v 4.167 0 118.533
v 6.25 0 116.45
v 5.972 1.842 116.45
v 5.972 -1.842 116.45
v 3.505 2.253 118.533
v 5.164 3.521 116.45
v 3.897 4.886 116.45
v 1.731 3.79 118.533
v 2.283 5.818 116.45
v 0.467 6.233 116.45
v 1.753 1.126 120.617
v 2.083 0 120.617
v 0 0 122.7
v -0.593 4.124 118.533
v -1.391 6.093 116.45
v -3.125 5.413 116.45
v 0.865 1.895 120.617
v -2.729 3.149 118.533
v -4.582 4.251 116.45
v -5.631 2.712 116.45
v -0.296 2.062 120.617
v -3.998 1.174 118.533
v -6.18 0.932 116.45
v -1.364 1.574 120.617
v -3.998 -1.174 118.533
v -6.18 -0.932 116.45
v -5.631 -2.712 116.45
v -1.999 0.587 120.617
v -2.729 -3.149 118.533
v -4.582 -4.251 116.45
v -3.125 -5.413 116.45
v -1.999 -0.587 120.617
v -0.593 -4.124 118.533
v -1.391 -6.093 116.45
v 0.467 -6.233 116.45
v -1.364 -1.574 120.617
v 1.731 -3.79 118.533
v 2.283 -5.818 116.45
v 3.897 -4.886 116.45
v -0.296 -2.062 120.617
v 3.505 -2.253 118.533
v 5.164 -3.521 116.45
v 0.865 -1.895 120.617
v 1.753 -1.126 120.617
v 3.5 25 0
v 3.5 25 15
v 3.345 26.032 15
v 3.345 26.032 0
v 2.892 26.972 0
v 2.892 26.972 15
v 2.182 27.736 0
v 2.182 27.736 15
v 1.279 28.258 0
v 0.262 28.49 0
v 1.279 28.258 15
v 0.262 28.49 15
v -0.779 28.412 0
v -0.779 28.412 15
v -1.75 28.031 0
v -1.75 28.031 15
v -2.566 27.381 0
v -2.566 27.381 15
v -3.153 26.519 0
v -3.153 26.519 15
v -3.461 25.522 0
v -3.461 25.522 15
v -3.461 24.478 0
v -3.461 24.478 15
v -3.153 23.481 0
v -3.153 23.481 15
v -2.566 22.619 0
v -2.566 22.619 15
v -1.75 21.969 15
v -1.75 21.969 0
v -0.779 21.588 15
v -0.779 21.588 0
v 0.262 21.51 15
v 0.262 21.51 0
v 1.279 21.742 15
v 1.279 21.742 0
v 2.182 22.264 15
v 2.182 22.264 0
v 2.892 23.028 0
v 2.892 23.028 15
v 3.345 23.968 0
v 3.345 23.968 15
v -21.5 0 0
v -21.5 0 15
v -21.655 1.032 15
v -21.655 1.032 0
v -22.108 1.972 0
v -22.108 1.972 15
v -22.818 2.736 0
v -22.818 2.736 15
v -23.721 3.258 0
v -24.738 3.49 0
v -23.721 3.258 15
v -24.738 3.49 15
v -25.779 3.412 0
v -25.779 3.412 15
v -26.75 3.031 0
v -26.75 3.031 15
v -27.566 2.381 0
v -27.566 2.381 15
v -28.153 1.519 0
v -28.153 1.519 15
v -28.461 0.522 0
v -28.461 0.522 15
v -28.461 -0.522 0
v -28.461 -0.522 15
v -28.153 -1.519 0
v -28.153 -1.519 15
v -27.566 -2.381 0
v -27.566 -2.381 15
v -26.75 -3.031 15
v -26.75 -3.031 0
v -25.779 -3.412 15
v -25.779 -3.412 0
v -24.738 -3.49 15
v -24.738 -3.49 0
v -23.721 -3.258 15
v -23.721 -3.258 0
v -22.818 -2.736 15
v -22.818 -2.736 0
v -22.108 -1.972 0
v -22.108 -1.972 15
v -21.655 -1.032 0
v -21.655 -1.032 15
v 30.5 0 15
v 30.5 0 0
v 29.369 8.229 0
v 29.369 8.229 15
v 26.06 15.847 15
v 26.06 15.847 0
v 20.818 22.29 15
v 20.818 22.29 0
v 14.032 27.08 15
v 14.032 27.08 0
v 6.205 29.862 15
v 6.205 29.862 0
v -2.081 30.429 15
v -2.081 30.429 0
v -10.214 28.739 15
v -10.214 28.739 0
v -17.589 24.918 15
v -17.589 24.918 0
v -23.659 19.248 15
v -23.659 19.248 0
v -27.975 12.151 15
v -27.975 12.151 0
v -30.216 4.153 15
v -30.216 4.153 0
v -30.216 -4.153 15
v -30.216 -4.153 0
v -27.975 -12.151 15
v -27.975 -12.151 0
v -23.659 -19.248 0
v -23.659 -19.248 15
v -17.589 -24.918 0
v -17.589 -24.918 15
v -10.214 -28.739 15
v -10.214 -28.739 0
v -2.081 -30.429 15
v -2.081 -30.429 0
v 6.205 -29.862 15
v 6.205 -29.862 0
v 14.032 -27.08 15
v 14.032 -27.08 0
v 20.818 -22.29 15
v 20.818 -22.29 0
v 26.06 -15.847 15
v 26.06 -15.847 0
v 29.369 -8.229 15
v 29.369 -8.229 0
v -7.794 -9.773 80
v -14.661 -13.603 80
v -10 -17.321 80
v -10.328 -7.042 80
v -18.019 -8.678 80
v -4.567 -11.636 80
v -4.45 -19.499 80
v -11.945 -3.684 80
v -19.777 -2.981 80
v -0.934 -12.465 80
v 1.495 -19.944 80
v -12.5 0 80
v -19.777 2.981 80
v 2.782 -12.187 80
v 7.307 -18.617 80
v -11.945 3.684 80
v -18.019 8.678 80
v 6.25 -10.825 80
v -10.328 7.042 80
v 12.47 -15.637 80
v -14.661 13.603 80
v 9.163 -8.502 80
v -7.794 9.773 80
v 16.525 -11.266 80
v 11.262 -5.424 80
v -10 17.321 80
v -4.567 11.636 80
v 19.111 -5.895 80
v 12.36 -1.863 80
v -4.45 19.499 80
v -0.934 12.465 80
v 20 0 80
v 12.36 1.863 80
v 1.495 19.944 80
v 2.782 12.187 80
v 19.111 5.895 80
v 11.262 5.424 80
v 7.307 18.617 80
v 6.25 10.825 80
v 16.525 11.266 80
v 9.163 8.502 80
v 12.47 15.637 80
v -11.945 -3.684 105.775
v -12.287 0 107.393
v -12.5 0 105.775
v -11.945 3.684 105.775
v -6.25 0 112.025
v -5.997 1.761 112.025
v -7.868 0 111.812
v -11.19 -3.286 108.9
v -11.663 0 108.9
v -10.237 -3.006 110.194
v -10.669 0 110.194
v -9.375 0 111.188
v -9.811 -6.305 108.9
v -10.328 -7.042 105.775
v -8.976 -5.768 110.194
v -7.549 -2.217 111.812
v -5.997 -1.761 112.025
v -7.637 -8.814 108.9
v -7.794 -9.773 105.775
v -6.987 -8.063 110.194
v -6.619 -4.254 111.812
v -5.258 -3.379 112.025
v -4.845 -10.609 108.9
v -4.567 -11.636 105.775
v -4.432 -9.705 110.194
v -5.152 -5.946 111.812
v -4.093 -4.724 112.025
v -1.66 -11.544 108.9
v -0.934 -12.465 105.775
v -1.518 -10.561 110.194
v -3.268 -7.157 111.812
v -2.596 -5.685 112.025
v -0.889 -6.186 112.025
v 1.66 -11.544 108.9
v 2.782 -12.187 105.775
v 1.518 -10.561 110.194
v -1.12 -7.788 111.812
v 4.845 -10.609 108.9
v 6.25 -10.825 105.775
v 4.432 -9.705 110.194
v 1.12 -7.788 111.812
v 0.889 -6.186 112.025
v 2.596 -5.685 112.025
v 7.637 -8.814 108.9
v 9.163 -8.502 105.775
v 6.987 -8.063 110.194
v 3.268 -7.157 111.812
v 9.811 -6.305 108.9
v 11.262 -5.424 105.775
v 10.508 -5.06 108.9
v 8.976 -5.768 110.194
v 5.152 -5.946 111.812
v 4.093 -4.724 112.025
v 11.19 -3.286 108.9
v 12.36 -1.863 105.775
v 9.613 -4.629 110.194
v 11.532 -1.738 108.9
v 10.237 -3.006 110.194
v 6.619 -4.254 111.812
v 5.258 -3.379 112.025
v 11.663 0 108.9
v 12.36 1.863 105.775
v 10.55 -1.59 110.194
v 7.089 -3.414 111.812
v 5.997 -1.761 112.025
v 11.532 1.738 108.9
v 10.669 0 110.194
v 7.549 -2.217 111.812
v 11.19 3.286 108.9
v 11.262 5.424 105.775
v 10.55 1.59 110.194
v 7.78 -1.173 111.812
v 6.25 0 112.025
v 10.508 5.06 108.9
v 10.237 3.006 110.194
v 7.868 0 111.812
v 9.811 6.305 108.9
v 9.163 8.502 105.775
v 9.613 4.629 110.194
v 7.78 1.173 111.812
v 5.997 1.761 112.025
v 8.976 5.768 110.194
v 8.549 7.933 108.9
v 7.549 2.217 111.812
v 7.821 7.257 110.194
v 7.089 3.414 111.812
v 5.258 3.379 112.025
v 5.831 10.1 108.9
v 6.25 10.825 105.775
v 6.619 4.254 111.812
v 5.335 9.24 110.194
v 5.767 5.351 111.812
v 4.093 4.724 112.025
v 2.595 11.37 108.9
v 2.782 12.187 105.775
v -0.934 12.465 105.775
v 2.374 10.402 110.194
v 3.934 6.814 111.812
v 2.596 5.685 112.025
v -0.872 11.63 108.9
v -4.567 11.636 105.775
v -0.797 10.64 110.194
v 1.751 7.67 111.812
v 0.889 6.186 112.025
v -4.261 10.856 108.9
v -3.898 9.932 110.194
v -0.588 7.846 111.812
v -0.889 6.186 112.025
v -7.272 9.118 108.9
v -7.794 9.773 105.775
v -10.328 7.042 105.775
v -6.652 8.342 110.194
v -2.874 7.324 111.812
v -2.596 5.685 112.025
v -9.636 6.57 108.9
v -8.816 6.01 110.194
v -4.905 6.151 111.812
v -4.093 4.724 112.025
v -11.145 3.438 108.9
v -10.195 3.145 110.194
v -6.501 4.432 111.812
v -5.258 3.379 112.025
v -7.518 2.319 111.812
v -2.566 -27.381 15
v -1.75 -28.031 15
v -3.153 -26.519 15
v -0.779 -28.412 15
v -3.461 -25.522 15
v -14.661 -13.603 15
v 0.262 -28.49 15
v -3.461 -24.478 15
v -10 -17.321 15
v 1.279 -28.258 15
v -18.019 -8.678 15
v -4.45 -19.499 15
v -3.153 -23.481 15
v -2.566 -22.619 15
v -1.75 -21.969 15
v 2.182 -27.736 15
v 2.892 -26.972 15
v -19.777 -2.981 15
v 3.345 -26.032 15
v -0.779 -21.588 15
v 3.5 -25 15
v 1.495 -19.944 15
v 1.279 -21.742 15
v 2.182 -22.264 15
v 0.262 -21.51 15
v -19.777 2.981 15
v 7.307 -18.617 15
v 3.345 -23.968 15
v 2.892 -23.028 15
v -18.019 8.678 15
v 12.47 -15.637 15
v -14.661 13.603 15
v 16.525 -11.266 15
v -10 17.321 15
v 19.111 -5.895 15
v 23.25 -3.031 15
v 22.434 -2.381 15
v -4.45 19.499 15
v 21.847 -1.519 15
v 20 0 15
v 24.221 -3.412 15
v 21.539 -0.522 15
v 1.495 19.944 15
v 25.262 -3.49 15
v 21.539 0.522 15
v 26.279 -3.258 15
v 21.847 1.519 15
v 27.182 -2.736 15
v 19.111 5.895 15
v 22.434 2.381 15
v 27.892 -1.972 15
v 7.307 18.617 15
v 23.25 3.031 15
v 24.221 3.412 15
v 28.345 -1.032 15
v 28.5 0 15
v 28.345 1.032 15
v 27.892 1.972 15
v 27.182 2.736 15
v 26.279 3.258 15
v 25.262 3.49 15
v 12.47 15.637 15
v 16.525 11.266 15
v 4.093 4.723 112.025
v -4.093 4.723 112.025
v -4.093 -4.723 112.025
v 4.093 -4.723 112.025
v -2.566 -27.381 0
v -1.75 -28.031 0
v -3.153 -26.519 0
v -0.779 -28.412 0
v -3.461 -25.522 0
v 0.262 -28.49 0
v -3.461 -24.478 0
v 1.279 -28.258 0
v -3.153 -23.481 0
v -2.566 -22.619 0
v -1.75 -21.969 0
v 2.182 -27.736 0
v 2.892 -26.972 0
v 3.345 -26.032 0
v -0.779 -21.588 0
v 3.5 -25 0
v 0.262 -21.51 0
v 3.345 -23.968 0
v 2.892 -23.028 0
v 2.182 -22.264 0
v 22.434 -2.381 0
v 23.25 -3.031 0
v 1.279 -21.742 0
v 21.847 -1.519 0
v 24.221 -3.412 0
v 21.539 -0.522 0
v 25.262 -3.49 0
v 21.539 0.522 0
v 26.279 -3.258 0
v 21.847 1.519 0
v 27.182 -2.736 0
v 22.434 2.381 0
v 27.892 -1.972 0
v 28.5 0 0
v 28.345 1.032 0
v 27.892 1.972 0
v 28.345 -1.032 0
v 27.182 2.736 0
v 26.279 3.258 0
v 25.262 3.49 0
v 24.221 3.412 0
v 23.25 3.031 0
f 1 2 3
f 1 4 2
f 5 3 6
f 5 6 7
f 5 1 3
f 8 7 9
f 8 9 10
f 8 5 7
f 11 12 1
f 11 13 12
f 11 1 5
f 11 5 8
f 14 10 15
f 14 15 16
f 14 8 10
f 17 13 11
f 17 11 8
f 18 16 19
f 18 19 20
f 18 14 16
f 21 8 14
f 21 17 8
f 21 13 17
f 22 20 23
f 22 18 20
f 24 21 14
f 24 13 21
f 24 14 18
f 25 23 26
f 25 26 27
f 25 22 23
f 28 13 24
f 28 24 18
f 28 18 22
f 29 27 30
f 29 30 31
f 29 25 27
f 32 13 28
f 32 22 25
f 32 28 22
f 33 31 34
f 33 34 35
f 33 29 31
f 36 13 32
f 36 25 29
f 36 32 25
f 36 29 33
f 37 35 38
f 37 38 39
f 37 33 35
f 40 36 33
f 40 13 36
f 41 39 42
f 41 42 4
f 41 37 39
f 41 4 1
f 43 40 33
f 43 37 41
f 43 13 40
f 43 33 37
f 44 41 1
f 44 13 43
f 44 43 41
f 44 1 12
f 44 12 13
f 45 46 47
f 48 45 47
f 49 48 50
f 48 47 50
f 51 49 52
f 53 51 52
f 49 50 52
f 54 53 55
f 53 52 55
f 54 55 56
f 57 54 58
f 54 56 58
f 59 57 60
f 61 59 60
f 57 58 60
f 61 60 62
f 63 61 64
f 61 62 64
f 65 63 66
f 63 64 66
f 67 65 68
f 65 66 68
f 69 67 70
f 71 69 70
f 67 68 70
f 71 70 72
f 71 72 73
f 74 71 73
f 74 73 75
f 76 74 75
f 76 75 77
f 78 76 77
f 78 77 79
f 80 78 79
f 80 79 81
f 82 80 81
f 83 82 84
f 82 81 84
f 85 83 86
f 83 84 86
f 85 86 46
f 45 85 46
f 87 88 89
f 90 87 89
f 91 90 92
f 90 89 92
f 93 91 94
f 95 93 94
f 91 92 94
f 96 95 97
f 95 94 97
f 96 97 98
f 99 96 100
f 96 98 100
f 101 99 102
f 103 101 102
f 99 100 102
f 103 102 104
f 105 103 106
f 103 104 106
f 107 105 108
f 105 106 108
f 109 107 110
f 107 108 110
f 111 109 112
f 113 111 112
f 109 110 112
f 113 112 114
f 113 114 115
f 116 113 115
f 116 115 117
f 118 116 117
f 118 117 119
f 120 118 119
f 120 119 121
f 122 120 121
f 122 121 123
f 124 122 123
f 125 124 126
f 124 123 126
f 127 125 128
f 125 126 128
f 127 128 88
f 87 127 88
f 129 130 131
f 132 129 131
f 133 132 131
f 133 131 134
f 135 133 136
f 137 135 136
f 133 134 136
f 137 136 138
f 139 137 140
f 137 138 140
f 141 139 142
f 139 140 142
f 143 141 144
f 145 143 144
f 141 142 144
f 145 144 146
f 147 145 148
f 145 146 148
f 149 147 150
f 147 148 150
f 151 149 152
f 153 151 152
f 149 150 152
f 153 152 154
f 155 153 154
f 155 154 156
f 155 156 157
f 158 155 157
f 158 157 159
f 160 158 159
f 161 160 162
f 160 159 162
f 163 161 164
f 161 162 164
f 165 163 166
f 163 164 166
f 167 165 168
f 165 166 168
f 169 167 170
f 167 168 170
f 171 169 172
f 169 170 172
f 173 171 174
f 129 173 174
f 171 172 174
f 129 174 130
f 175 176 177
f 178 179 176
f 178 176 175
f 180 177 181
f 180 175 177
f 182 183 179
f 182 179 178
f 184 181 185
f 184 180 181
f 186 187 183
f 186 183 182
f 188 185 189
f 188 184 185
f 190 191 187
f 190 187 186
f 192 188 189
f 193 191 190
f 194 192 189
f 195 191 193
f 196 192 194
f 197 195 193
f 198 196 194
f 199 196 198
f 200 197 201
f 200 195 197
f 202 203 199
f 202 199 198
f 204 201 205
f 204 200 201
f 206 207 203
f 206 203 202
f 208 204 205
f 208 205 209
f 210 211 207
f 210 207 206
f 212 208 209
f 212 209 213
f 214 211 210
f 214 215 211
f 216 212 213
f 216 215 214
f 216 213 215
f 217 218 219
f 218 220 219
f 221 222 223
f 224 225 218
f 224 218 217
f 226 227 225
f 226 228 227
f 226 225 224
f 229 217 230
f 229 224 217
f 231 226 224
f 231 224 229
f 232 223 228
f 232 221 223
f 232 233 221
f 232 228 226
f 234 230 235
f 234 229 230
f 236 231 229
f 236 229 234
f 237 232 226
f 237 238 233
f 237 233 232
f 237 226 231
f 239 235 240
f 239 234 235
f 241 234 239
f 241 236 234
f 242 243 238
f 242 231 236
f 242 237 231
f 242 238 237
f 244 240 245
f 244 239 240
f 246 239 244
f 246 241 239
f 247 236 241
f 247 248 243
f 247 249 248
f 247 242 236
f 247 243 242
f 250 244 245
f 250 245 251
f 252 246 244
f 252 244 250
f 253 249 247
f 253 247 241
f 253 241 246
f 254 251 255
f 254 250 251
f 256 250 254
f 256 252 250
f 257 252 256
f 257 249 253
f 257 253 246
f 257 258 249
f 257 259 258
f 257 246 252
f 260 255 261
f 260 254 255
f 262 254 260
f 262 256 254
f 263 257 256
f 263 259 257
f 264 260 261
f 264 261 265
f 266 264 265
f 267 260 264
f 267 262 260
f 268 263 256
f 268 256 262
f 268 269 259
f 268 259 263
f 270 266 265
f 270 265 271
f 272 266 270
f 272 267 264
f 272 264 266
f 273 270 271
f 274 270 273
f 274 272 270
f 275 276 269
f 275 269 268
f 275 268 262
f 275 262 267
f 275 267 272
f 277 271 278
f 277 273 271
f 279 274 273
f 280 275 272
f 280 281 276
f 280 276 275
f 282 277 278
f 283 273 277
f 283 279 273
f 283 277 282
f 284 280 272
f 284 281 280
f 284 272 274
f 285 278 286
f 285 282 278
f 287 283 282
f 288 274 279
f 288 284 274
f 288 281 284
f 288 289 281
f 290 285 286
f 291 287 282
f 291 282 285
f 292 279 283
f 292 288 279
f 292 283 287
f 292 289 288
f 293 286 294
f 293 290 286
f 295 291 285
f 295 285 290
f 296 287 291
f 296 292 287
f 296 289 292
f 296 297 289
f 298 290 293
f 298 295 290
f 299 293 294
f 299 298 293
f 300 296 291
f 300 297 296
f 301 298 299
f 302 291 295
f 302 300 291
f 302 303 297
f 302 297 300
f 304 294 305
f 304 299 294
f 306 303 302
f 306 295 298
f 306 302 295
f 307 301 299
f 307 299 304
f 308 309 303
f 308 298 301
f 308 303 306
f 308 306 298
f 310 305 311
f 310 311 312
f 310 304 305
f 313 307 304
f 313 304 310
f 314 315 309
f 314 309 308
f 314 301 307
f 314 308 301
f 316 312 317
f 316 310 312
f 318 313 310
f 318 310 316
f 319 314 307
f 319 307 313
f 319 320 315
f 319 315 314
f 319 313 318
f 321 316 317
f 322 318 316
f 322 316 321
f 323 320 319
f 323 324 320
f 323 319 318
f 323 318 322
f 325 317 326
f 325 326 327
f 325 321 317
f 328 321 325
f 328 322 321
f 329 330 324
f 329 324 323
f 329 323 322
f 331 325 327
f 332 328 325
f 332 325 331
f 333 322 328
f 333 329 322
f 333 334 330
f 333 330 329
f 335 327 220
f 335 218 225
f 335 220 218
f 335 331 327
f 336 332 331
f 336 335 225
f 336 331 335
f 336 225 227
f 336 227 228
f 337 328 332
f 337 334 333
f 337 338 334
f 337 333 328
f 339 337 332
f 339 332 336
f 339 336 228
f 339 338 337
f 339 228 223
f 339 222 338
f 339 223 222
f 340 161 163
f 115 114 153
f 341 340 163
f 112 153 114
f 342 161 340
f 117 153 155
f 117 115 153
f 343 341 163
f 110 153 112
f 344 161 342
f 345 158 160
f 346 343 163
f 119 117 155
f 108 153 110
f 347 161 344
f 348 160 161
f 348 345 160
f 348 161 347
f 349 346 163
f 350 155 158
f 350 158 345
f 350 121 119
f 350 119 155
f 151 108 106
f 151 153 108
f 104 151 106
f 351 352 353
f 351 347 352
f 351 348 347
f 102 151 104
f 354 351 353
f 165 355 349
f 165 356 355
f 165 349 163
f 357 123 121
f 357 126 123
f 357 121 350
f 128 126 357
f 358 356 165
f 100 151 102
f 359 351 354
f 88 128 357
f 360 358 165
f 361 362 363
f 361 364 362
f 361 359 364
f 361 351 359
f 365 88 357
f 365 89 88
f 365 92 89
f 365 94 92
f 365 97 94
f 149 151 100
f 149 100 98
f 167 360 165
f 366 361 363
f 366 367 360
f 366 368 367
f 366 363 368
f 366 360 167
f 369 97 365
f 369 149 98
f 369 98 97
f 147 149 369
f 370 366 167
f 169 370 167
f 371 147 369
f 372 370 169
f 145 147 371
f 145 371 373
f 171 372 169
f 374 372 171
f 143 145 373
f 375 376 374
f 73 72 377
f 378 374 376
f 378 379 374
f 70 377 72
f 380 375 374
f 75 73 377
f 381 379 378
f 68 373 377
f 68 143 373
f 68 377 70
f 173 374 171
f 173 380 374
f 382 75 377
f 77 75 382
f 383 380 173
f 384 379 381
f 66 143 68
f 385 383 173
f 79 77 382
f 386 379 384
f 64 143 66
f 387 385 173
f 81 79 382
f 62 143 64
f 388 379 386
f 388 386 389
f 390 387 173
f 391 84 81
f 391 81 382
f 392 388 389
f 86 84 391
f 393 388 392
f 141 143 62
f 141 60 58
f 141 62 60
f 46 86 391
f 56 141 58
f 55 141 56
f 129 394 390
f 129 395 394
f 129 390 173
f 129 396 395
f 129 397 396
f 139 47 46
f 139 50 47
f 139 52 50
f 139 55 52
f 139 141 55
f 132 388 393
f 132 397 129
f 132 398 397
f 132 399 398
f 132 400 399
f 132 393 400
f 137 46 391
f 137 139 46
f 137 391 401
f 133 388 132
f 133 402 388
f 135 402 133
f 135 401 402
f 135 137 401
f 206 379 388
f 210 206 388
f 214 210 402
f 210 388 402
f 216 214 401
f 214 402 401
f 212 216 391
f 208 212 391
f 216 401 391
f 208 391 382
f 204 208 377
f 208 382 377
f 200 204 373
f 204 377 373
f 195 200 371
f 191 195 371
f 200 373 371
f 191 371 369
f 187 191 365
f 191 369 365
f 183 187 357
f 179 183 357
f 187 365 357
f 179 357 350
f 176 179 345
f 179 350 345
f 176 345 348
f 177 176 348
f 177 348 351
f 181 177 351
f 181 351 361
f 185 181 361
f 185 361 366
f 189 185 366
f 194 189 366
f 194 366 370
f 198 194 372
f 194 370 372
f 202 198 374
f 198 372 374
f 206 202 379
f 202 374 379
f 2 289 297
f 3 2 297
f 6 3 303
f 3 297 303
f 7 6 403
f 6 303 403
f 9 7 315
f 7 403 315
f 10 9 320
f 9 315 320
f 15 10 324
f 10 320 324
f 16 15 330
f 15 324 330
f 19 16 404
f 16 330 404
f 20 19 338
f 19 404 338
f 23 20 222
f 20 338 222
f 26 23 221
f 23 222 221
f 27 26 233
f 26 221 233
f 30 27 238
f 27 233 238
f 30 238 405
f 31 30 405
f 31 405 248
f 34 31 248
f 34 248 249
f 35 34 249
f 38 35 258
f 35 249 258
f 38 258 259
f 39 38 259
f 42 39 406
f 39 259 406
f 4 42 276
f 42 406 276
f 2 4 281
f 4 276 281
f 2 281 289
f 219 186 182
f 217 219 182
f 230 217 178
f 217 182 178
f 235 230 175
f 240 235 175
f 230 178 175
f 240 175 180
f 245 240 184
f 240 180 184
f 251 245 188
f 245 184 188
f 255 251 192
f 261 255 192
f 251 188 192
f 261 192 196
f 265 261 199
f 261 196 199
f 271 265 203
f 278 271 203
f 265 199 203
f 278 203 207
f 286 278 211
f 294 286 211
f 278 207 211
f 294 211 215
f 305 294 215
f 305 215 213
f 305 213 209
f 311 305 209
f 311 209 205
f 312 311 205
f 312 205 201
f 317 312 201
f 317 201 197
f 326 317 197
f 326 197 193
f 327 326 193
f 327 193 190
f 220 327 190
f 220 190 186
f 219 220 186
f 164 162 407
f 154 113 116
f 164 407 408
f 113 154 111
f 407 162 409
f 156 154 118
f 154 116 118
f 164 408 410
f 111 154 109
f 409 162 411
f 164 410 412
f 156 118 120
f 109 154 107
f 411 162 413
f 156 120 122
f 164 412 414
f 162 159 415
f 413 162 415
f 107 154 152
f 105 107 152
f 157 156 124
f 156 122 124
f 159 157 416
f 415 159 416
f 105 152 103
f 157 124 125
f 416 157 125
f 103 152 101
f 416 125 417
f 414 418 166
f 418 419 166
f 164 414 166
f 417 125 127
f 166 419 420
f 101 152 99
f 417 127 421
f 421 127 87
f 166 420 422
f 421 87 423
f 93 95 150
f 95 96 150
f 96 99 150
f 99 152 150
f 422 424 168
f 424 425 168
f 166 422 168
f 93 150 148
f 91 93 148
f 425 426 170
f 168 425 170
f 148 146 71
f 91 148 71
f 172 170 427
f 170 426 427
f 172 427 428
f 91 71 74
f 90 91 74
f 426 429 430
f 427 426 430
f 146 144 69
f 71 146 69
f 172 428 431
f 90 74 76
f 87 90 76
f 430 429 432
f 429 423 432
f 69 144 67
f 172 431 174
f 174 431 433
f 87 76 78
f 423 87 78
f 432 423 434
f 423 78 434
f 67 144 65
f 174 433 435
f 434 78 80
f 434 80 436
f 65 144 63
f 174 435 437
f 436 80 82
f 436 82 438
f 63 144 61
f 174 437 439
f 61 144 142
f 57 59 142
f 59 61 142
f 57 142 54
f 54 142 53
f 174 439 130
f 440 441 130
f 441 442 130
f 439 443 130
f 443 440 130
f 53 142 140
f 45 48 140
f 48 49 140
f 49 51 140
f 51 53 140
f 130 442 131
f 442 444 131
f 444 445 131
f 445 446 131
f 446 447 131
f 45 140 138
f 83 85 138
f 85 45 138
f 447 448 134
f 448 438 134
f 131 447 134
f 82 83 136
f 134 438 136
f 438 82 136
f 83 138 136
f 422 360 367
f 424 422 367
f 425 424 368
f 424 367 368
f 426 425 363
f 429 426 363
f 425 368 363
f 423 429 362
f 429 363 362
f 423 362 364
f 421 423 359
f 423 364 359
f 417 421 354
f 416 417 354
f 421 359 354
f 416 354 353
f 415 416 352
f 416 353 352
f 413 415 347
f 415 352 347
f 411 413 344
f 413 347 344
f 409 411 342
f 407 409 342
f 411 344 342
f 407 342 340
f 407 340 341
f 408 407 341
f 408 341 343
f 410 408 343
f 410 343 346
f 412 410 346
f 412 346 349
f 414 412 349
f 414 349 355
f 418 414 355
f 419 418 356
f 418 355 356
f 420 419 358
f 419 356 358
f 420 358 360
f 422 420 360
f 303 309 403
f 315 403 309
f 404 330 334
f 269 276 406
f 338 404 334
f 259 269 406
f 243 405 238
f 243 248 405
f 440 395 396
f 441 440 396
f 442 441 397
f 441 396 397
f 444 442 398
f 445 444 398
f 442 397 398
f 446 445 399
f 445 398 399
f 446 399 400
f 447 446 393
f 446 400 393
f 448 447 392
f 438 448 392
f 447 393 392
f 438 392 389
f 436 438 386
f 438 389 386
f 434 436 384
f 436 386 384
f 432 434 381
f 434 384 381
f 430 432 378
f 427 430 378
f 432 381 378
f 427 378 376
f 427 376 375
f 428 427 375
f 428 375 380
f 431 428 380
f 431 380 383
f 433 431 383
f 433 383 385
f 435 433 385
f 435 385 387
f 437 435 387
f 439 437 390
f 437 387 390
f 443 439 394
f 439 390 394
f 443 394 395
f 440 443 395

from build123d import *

# Parameters (mm, degrees)
SKETCH1_R           = 30.5
BOSS_EXTRUDE1_DEPTH = 15
SKETCH2_R           = 3.5
CUT_EXTRUDE1_DEPTH  = 15
SKETCH3_R           = 20
BOSS_EXTRUDE2_DEPTH = 65
SKETCH4_R           = 12.5
BOSS_EXTRUDE3_DEPTH = 42.7
CUT_EXTRUDE2_START  = -10.675
SKETCH5_R           = 12.5
SKETCH5_R_2         = 6.25
CUT_EXTRUDE2_DEPTH  = 10.675
FILLET1_R           = 6.25
CHAMFER1_SIZE       = 6.25


with BuildPart() as part:
    # Sketch1 → Boss-Extrude1 (new body)
    with BuildSketch(Plane.XY):
        Circle(SKETCH1_R)
    extrude(amount=BOSS_EXTRUDE1_DEPTH)

    # Sketch2 → Cut-Extrude1 (cut)
    with BuildSketch(Plane.XY.offset(15)):
        with Locations((0, 25)):
            Circle(SKETCH2_R)
        with Locations((25, 0)):
            Circle(SKETCH2_R)
        with Locations((0, -25)):
            Circle(SKETCH2_R)
        with Locations((-25, 0)):
            Circle(SKETCH2_R)
    extrude(amount=-CUT_EXTRUDE1_DEPTH, mode=Mode.SUBTRACT)

    # Sketch3 → Boss-Extrude2 (add)
    with BuildSketch(Plane.XY.offset(15)):
        Circle(SKETCH3_R)
    extrude(amount=BOSS_EXTRUDE2_DEPTH)

    # Sketch4 → Boss-Extrude3 (add)
    with BuildSketch(Plane.XY.offset(80)):
        with Locations(Location((0, 0, 0), (0, 0, 180))):
            Circle(SKETCH4_R)
    extrude(amount=BOSS_EXTRUDE3_DEPTH)

    # Sketch5 → Cut-Extrude2 (cut)
    with BuildSketch(Plane.XY.offset(122.7).offset(CUT_EXTRUDE2_START)):
        with Locations(Location((0, 0, 0), (0, 0, 180))):
            Circle(SKETCH5_R)
        Circle(SKETCH5_R_2, mode=Mode.SUBTRACT)
    extrude(amount=CUT_EXTRUDE2_DEPTH, mode=Mode.SUBTRACT)

    # Fillet1
    fillet1_edges = [part.edges().sort_by_distance(p)[0] for p in [
        (12.5, 0, 112.025),
    ]]
    fillet(fillet1_edges, radius=FILLET1_R - 0.0001)  # a hair under: the kernel refuses the full size

    # Chamfer1
    chamfer1_edges = [part.edges().sort_by_distance(p)[0] for p in [
        (-6.25, 0, 122.7),
    ]]
    chamfer(chamfer1_edges, length=CHAMFER1_SIZE)


solid = part.part
